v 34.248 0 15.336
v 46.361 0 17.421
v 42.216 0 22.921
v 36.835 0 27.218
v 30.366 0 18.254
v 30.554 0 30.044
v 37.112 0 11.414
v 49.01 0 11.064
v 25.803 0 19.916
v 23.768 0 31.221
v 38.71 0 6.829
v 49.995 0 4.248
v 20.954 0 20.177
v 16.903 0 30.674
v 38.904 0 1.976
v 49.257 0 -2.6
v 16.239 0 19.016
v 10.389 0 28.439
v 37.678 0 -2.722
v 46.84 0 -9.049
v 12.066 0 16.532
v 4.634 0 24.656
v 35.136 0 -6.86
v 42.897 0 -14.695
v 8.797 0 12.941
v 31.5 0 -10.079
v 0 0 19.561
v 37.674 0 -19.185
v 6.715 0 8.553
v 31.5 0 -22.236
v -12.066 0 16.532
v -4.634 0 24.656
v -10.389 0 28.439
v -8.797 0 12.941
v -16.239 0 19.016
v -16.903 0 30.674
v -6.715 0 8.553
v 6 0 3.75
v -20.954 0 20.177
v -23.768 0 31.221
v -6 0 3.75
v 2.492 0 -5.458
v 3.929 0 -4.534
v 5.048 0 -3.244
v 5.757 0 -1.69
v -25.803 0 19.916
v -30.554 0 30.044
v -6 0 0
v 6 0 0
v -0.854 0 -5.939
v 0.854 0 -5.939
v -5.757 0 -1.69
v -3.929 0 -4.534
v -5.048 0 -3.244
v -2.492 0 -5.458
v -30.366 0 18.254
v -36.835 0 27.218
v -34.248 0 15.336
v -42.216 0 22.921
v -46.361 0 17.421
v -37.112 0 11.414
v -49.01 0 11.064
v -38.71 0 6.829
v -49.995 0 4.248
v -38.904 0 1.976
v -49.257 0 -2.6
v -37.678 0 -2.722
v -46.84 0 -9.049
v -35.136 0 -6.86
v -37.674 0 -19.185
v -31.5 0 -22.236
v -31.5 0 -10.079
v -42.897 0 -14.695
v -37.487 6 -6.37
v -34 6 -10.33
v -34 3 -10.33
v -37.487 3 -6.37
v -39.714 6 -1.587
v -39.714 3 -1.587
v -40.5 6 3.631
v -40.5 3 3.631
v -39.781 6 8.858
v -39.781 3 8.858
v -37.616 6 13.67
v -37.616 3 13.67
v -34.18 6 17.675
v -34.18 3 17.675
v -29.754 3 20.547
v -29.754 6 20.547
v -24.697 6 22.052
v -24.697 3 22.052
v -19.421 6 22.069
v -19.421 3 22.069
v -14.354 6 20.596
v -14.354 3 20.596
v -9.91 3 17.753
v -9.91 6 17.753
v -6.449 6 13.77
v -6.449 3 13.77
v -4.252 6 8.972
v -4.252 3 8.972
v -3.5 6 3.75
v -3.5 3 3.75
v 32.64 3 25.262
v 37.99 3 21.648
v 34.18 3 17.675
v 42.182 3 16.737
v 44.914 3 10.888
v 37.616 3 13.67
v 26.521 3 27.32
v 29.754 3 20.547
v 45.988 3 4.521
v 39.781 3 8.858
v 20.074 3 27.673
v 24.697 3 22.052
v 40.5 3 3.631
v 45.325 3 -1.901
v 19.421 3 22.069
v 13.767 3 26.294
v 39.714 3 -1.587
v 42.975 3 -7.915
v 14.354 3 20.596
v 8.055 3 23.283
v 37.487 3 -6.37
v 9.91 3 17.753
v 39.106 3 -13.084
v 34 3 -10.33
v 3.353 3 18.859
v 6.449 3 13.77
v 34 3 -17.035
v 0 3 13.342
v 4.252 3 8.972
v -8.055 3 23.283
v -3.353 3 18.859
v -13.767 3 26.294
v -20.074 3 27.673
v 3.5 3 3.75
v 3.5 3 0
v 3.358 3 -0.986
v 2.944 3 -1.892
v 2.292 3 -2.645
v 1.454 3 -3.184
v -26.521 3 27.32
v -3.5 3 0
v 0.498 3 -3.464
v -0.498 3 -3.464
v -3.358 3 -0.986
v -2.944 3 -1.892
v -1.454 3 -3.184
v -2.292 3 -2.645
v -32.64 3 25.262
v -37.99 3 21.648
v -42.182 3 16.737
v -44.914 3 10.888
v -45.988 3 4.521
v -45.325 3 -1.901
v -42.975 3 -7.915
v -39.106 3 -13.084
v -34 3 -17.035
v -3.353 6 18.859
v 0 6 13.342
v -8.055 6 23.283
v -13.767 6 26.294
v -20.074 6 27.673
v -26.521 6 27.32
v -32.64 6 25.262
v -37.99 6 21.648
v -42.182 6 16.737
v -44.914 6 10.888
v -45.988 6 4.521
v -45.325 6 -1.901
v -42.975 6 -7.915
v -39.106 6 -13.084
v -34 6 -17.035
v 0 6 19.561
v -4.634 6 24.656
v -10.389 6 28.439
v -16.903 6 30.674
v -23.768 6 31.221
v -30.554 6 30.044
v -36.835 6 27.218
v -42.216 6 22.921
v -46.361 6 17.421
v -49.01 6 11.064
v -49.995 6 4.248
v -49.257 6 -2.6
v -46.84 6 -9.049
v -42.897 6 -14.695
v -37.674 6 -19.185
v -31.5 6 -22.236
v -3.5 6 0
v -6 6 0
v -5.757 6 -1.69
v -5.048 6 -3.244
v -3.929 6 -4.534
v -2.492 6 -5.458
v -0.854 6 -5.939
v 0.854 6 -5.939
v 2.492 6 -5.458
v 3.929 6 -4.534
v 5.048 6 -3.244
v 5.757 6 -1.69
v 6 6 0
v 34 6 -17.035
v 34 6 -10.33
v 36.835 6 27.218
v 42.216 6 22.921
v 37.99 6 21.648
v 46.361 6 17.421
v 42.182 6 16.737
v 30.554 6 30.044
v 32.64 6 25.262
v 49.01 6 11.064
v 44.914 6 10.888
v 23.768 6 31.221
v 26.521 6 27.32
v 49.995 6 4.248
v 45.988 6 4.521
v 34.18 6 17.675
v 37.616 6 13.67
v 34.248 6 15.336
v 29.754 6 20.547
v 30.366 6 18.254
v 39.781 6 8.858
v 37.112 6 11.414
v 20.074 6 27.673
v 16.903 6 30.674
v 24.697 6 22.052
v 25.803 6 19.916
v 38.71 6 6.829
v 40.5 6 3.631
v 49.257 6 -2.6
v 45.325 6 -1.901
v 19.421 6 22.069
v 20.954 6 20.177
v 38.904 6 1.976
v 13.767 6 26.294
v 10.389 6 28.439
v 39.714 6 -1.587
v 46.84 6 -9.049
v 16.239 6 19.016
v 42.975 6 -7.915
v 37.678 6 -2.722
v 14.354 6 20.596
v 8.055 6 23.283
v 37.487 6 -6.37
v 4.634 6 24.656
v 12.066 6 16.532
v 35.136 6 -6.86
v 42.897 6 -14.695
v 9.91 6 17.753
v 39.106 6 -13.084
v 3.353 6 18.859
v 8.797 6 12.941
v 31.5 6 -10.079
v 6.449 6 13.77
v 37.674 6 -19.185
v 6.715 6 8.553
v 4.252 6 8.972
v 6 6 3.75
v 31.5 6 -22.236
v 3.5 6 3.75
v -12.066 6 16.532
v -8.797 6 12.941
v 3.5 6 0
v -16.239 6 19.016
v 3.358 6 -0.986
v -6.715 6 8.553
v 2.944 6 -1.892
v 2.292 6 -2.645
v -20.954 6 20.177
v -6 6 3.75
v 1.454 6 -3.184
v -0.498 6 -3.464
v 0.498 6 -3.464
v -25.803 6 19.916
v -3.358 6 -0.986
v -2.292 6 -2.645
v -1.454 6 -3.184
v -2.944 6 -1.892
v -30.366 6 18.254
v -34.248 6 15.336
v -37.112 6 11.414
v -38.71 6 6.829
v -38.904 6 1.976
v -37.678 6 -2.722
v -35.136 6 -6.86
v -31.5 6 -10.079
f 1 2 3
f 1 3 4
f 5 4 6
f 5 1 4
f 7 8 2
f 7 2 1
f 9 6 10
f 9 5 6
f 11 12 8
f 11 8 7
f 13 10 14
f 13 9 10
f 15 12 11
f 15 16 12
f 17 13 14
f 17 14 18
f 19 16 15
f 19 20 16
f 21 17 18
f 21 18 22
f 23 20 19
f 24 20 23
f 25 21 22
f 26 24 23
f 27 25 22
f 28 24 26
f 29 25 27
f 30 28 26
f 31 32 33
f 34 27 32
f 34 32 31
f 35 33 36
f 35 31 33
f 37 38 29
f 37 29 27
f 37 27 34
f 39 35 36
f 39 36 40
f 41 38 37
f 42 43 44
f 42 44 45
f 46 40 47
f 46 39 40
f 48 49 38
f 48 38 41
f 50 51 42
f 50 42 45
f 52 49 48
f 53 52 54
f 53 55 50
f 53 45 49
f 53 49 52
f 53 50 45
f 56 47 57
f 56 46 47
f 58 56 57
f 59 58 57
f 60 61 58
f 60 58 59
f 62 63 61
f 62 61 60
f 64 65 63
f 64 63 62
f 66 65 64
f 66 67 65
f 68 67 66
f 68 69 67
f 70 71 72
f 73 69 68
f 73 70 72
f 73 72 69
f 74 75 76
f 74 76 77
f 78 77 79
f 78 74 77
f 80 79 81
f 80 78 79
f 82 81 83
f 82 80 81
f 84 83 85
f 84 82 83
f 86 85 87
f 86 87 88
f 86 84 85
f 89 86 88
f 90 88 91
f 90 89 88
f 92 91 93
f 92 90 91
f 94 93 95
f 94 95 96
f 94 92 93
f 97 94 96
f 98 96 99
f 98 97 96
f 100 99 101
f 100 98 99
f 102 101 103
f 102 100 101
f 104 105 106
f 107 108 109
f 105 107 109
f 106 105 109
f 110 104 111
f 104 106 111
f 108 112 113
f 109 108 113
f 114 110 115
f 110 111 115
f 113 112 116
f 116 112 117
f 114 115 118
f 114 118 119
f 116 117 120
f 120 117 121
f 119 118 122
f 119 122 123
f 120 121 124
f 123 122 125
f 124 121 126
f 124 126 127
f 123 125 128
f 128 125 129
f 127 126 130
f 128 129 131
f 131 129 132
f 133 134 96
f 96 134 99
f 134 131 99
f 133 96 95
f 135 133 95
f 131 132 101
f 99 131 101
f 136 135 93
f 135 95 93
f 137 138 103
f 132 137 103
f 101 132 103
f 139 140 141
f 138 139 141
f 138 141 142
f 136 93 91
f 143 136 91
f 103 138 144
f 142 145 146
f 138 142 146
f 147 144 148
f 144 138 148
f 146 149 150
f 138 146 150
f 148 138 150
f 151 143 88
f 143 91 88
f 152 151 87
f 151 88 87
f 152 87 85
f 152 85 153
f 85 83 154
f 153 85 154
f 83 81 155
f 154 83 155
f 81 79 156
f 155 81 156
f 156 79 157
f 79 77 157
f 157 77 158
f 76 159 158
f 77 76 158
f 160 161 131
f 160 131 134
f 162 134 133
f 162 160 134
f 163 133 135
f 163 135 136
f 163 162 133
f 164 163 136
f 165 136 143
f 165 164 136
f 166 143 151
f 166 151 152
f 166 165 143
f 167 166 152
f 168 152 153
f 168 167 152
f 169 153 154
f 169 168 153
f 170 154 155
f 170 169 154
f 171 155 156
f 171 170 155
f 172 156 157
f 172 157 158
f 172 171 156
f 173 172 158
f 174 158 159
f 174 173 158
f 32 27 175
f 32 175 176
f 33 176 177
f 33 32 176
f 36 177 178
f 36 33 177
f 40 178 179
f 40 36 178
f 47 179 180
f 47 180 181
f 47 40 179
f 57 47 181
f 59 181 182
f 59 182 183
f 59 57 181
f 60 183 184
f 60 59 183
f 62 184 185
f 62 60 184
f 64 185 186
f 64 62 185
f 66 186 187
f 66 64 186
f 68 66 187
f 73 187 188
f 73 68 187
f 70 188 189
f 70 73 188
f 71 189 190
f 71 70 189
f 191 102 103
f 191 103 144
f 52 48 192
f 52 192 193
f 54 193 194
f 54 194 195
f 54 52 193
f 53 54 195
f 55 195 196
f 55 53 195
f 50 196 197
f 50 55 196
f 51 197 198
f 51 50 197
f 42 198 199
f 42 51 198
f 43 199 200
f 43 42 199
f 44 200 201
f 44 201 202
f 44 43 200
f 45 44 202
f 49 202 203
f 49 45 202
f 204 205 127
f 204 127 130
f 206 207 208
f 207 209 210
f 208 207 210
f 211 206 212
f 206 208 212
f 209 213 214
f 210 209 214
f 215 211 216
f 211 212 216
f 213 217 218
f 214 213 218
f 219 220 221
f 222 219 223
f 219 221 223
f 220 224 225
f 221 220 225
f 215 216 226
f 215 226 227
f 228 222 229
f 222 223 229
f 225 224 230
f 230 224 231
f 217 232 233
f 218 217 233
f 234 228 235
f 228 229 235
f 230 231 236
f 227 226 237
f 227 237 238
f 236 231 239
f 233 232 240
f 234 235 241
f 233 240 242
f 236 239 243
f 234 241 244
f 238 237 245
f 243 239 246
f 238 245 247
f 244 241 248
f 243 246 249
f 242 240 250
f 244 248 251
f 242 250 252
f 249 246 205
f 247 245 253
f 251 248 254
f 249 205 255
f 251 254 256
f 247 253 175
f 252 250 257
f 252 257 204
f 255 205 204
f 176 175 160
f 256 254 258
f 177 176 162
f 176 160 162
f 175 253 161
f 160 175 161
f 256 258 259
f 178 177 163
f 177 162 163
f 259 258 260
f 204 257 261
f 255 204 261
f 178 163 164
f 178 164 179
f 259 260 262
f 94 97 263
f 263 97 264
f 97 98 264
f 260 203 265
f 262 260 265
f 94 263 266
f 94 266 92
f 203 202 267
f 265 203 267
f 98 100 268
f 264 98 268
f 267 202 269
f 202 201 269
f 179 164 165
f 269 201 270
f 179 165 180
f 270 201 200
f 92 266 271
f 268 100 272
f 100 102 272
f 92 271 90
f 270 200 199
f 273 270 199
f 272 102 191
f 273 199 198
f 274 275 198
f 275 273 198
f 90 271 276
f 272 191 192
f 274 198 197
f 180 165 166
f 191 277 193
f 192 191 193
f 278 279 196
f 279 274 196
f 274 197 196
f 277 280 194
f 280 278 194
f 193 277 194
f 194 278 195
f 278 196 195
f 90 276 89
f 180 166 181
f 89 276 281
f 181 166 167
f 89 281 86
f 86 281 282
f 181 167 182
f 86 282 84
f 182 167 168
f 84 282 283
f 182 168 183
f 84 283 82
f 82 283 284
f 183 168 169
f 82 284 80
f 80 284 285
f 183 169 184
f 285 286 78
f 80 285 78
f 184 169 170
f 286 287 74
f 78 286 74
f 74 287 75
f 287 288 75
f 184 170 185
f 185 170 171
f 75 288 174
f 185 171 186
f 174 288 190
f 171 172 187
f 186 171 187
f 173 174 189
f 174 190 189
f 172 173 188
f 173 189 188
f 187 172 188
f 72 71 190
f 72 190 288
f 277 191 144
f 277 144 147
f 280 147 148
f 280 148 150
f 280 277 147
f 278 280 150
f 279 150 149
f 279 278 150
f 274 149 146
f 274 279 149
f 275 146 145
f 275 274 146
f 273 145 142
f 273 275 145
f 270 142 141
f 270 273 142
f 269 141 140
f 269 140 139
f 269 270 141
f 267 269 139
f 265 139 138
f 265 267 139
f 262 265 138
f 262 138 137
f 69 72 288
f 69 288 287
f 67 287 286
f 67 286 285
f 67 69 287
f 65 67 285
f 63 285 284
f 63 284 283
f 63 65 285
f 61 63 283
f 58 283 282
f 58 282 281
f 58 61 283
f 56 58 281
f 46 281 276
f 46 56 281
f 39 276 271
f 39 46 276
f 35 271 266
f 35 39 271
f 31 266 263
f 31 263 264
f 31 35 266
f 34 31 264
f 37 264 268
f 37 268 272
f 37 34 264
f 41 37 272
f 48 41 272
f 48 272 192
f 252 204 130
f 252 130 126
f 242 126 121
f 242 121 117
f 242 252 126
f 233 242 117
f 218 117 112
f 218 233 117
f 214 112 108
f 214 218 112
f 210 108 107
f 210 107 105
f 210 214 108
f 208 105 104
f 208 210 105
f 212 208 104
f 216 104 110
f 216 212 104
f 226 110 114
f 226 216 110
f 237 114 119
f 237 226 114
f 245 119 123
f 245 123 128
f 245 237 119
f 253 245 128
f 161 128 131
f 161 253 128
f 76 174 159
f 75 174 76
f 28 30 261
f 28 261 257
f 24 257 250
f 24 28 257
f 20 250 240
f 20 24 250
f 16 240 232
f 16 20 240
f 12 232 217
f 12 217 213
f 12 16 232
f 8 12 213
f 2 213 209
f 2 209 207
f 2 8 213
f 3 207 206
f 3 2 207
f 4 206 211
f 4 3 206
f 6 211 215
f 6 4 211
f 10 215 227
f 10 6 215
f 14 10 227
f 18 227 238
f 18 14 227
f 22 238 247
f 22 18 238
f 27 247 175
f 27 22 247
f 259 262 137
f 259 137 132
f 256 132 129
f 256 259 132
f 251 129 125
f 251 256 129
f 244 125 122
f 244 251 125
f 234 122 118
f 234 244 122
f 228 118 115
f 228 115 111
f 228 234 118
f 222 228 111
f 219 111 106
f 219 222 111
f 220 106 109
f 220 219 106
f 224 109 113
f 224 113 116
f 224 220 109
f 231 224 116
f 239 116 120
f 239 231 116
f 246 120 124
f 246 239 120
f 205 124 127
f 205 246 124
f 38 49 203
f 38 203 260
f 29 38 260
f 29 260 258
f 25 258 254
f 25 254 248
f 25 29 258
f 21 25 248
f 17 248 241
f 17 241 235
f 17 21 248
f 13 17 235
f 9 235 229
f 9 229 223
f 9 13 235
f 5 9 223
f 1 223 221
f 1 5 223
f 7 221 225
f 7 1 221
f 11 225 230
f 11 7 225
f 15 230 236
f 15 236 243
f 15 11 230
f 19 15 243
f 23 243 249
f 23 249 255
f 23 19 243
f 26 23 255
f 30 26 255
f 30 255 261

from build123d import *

# Parameters (mm, degrees)
EXTRUDE_1_DEPTH     = 6
CUT_EXTRUDE_1_DEPTH = 3


with BuildPart() as part:
    # Эскиз1 → Бобышка-Вытянуть1 (new body)
    with BuildSketch(Plane(origin=(0, 0, 0), x_dir=(1, 0, 0), z_dir=(0, 1, 0))):
        with BuildLine():
            Line((-6, -3.75), (-6, 0))
            ThreePointArc((-6, 0), (0, 6), (6, 0))
            Line((6, 0), (6, -3.75))
            ThreePointArc((6, -3.75), (30.366066361, -18.254309704), (31.5, 10.079316686))
            Line((31.5, 10.079316686), (31.5, 22.23557292))
            ThreePointArc((31.5, 22.23557292), (44.461534369, -20.301163348), (0, -19.561388301))
            ThreePointArc((0, -19.561388301), (-44.461534369, -20.301163348), (-31.5, 22.23557292))
            Line((-31.5, 22.23557292), (-31.5, 10.079316686))
            ThreePointArc((-31.5, 10.079316686), (-30.366066361, -18.254309704), (-6, -3.75))
        make_face()
    extrude(amount=EXTRUDE_1_DEPTH)

    # Эскиз4 → Вырез-Вытянуть1 (cut)
    with BuildSketch(Plane(origin=(0, 6, 0), x_dir=(1, 0, 0), z_dir=(0, 1, 0))):
        with BuildLine():
            Line((-3.5, -3.75), (-3.5, 0))
            ThreePointArc((-3.5, 0), (0, 3.5), (3.5, 0))
            Line((3.5, 0), (3.5, -3.75))
            ThreePointArc((3.5, -3.75), (29.75403121, -20.546577032), (34, 10.33012784))
            Line((34, 10.33012784), (34, 17.034609691))
            ThreePointArc((34, 17.034609691), (37.989980812, -21.647500207), (0, -13.341663047))
            ThreePointArc((0, -13.341663047), (-37.989980812, -21.647500207), (-34, 17.034609691))
            Line((-34, 17.034609691), (-34, 10.33012784))
            ThreePointArc((-34, 10.33012784), (-29.75403121, -20.546577032), (-3.5, -3.75))
        make_face()
    extrude(amount=-CUT_EXTRUDE_1_DEPTH, mode=Mode.SUBTRACT)


solid = part.part
